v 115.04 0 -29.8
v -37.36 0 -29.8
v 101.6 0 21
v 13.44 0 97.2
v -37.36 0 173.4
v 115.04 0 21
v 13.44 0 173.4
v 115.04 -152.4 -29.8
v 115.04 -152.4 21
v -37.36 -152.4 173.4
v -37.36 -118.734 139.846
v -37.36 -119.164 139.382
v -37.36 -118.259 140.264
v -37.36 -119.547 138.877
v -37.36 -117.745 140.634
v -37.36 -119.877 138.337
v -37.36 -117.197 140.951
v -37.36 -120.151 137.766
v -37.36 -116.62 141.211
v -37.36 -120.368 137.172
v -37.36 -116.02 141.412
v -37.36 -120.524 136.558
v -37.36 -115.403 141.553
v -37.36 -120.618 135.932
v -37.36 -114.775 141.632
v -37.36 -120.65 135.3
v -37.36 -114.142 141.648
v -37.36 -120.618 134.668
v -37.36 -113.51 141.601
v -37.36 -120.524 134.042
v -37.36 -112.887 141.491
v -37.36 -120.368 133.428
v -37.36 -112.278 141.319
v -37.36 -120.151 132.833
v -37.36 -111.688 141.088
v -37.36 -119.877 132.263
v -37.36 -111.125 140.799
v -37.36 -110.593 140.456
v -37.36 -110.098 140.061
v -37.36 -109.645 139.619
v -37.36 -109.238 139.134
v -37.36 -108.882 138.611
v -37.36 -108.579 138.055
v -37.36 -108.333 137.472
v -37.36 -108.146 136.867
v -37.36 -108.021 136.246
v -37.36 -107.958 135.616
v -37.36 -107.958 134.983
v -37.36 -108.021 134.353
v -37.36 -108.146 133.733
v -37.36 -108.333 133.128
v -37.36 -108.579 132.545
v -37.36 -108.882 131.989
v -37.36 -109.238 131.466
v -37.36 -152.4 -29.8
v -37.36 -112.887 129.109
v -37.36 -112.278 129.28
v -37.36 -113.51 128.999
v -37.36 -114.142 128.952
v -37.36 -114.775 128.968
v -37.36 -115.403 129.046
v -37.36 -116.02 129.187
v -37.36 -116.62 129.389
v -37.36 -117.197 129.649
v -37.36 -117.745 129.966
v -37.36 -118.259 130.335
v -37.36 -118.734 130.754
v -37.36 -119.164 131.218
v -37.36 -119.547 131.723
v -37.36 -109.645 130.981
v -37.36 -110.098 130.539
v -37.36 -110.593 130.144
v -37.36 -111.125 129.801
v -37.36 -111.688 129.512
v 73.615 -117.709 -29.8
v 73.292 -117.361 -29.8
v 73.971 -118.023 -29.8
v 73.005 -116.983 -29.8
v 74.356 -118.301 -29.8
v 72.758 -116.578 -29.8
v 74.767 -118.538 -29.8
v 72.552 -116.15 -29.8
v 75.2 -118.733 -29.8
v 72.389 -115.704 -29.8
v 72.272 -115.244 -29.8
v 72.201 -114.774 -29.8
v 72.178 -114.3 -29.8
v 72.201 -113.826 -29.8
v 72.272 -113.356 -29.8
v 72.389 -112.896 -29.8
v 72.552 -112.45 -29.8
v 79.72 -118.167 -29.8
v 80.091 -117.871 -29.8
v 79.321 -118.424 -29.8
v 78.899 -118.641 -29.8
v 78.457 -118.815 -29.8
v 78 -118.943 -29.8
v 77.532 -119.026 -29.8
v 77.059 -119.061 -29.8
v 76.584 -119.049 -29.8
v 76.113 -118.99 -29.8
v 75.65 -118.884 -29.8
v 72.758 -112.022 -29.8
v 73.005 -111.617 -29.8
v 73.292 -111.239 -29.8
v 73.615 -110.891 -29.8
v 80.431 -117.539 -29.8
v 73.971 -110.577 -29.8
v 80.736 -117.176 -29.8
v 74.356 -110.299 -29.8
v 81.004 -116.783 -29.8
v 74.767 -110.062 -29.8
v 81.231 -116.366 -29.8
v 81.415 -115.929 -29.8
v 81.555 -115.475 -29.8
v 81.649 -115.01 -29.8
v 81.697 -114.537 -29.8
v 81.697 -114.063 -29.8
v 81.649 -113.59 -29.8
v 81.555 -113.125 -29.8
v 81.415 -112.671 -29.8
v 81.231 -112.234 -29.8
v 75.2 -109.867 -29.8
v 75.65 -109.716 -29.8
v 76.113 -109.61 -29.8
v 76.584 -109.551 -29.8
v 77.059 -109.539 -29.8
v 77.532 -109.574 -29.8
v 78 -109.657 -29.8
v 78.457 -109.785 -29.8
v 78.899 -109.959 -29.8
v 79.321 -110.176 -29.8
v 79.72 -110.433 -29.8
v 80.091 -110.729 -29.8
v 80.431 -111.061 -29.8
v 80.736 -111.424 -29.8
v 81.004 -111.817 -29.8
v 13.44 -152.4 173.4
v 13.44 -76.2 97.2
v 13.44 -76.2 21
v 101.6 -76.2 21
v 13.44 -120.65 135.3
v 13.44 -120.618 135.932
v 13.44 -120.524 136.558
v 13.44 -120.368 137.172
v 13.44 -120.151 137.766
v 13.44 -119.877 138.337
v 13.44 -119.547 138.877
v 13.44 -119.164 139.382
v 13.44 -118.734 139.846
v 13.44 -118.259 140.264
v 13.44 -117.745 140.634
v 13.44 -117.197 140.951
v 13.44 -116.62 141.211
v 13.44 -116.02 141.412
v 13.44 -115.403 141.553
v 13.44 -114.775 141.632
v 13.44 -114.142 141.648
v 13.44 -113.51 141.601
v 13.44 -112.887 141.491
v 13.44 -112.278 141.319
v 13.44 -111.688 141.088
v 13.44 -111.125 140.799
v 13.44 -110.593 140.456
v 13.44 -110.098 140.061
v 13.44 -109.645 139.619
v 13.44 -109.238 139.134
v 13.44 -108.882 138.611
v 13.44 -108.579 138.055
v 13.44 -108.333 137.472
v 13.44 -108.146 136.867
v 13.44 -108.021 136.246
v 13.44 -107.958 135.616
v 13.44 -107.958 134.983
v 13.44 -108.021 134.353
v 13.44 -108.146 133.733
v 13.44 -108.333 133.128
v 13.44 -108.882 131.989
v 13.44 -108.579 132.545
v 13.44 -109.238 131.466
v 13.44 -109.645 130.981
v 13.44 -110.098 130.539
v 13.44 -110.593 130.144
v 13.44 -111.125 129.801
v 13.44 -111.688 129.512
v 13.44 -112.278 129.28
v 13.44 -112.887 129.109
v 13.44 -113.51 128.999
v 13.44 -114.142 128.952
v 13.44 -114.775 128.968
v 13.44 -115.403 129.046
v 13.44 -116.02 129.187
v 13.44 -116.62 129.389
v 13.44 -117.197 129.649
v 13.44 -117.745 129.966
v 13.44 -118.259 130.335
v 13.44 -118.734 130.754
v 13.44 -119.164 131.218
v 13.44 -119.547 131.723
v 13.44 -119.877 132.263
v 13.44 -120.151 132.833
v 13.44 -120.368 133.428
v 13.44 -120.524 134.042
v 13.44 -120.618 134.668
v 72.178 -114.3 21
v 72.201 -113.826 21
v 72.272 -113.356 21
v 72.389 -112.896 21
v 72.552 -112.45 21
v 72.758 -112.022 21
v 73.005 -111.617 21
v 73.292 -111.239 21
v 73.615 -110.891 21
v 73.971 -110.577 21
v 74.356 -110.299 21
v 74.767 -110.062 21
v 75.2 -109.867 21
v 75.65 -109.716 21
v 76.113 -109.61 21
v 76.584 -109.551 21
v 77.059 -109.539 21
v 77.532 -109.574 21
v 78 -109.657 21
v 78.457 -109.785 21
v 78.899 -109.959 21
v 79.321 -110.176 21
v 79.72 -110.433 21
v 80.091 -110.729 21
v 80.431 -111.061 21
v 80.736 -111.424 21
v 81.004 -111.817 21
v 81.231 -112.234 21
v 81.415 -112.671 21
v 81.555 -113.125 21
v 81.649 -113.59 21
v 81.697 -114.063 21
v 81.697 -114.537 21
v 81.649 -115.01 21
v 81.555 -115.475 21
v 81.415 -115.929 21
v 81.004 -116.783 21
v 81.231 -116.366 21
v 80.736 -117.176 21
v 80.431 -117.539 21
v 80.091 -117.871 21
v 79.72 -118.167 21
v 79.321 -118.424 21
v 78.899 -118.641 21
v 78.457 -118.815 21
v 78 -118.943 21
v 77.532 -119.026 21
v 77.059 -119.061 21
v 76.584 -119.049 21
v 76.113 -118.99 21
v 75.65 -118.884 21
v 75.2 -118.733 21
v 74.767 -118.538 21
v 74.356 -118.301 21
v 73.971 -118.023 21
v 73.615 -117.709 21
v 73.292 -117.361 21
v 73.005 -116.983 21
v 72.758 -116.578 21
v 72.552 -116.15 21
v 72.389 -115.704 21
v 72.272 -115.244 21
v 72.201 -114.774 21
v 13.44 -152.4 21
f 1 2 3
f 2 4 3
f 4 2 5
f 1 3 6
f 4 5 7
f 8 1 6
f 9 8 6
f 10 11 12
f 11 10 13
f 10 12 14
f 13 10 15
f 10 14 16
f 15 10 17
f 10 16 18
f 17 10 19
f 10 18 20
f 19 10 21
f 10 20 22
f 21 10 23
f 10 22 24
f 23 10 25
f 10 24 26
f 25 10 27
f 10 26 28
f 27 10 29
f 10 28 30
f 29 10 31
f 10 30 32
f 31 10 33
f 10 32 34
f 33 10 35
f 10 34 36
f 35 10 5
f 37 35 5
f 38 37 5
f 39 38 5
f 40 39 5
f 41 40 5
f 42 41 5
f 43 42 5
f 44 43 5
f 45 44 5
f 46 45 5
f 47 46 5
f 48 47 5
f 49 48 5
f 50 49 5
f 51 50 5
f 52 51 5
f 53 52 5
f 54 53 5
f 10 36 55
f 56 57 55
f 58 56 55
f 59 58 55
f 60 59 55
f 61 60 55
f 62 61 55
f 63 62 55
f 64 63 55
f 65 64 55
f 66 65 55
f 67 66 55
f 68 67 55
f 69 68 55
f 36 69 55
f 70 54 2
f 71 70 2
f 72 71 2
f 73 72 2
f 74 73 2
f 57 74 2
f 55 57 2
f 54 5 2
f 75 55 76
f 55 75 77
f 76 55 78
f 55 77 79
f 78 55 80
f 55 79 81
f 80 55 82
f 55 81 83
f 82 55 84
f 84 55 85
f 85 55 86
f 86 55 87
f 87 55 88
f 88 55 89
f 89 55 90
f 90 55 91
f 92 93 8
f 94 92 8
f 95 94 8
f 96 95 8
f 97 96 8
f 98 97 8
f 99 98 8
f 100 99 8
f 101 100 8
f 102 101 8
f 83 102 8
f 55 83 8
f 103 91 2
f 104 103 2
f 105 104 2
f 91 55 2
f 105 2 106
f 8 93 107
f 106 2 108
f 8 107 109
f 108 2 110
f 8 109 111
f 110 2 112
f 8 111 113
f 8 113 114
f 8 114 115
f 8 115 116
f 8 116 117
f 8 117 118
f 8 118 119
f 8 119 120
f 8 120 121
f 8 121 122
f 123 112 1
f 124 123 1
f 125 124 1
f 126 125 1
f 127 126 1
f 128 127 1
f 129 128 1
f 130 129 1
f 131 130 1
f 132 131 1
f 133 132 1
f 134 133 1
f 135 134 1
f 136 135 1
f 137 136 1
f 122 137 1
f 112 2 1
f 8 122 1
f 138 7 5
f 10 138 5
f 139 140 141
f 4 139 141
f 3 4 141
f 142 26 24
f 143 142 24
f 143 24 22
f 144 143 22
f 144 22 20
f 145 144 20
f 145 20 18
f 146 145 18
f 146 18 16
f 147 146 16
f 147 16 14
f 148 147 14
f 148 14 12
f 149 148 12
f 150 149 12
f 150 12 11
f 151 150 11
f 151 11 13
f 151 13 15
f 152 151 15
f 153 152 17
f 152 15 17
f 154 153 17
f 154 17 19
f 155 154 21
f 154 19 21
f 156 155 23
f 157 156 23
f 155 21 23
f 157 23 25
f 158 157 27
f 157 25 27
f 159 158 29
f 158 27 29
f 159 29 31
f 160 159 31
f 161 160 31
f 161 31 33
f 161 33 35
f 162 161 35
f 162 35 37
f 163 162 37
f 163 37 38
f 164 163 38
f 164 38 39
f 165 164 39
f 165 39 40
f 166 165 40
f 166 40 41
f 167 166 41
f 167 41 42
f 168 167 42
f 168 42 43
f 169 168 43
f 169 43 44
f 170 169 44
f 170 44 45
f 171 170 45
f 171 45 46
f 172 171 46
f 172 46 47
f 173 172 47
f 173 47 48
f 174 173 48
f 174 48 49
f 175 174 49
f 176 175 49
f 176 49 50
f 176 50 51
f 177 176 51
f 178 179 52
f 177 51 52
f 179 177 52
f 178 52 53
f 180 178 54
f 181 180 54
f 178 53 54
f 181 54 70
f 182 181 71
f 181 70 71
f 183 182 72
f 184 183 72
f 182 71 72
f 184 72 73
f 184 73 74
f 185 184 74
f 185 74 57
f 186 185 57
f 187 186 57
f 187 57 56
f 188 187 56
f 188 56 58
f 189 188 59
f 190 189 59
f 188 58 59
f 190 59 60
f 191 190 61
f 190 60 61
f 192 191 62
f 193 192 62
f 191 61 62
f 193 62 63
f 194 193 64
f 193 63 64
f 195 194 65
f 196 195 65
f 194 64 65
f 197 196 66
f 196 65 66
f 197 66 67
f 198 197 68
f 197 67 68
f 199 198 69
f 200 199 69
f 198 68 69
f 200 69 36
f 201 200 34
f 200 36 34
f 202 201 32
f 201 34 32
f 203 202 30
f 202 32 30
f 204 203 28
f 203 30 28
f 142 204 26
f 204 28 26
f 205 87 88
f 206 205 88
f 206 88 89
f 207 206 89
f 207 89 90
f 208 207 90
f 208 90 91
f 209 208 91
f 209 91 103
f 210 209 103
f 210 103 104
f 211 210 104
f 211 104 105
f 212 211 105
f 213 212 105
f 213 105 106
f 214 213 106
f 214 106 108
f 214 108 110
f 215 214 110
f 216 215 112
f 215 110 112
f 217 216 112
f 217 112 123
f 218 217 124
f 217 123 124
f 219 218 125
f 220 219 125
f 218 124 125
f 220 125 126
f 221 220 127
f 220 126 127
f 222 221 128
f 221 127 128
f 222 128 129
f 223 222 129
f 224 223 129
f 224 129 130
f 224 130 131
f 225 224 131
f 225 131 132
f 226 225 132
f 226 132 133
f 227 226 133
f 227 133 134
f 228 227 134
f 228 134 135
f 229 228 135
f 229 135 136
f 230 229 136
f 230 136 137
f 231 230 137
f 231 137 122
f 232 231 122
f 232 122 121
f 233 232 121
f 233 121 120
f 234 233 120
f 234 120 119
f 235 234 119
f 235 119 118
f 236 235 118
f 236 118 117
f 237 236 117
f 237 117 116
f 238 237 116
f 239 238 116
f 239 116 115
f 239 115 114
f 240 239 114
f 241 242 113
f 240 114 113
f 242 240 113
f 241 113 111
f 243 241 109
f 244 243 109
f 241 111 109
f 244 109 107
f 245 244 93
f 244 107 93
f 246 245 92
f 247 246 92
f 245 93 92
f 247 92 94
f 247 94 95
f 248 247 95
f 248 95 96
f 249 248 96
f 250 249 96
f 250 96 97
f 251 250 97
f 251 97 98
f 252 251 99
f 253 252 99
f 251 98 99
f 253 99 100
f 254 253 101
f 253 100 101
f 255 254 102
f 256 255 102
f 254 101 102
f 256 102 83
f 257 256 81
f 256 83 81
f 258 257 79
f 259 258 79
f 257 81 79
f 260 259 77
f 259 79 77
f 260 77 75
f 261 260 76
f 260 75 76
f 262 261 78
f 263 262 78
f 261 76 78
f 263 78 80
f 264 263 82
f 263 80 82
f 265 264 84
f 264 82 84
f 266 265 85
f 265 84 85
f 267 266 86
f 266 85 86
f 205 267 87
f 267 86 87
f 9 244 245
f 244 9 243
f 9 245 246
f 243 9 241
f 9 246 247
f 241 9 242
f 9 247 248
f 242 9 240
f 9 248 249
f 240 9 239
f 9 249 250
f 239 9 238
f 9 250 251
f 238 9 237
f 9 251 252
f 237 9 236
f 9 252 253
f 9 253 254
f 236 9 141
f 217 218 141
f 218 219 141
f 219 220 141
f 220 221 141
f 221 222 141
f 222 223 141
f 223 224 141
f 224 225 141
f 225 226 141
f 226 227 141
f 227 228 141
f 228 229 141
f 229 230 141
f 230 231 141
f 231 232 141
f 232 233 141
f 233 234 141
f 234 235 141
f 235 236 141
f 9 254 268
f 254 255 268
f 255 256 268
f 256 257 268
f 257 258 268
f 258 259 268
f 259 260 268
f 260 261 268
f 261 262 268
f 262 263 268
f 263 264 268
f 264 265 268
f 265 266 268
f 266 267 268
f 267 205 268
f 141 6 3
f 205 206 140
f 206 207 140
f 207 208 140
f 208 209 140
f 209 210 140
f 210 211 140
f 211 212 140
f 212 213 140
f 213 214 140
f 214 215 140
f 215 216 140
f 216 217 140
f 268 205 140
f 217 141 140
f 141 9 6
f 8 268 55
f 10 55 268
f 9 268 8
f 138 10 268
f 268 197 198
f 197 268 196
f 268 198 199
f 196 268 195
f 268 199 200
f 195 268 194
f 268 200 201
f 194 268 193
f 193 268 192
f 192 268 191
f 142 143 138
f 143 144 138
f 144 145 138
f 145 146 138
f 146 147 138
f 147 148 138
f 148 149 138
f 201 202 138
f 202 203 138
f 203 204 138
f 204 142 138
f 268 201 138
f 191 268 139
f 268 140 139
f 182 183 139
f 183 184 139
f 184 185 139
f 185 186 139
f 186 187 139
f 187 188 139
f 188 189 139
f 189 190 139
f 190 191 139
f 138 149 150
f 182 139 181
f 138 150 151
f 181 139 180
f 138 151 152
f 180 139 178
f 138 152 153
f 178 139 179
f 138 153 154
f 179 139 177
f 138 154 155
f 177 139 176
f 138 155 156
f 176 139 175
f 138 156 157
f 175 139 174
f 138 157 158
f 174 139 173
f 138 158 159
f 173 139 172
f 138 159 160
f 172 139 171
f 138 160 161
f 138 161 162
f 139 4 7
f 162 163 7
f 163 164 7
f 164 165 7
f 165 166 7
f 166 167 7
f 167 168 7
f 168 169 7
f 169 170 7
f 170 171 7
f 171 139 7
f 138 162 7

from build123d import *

# Parameters (mm, degrees)
F1_DEPTH = 152.4
F2_W     = 101.6
F2_H     = 76.2
F3_DEPTH = 76.2
F5_DEPTH = 76.2
F7_D     = 9.525
F9_D     = 12.7


with BuildPart() as f1:
    # F0 (on Front) → F1 (new body)
    with BuildSketch(Plane.XZ):
        Polygon((13.440086, 20.999823), (13.440086, 173.399823), (-37.359914, 173.399823), (-37.359914, -29.800177), (115.040086, -29.800177), (115.040086, 20.999823), align=None)
    extrude(amount=F1_DEPTH)

    # F2 (on face) → F3 (join)
    with BuildSketch(Plane.XY.offset(20.999823)):
        with Locations((50.8, -38.1)):
            Rectangle(F2_W, F2_H)
    extrude(amount=F3_DEPTH)

    # F4 (on face) → F5 (cut)
    with BuildSketch(Plane.XZ.offset(76.2)):
        Polygon((101.6, 97.199823), (13.440086, 97.199823), (101.6, 20.999823), align=None)
    extrude(amount=-F5_DEPTH, mode=Mode.SUBTRACT)

    # F7 (through all)
    with Locations(Plane.XY.offset(20.999823)):
        with Locations((76.940086, -114.3)):
            Hole(F7_D / 2)

    # F9 (through all)
    with Locations(Plane.YZ.offset(13.440086)):
        with Locations((-114.3, 135.299823)):
            Hole(F9_D / 2)


solid = f1.part
